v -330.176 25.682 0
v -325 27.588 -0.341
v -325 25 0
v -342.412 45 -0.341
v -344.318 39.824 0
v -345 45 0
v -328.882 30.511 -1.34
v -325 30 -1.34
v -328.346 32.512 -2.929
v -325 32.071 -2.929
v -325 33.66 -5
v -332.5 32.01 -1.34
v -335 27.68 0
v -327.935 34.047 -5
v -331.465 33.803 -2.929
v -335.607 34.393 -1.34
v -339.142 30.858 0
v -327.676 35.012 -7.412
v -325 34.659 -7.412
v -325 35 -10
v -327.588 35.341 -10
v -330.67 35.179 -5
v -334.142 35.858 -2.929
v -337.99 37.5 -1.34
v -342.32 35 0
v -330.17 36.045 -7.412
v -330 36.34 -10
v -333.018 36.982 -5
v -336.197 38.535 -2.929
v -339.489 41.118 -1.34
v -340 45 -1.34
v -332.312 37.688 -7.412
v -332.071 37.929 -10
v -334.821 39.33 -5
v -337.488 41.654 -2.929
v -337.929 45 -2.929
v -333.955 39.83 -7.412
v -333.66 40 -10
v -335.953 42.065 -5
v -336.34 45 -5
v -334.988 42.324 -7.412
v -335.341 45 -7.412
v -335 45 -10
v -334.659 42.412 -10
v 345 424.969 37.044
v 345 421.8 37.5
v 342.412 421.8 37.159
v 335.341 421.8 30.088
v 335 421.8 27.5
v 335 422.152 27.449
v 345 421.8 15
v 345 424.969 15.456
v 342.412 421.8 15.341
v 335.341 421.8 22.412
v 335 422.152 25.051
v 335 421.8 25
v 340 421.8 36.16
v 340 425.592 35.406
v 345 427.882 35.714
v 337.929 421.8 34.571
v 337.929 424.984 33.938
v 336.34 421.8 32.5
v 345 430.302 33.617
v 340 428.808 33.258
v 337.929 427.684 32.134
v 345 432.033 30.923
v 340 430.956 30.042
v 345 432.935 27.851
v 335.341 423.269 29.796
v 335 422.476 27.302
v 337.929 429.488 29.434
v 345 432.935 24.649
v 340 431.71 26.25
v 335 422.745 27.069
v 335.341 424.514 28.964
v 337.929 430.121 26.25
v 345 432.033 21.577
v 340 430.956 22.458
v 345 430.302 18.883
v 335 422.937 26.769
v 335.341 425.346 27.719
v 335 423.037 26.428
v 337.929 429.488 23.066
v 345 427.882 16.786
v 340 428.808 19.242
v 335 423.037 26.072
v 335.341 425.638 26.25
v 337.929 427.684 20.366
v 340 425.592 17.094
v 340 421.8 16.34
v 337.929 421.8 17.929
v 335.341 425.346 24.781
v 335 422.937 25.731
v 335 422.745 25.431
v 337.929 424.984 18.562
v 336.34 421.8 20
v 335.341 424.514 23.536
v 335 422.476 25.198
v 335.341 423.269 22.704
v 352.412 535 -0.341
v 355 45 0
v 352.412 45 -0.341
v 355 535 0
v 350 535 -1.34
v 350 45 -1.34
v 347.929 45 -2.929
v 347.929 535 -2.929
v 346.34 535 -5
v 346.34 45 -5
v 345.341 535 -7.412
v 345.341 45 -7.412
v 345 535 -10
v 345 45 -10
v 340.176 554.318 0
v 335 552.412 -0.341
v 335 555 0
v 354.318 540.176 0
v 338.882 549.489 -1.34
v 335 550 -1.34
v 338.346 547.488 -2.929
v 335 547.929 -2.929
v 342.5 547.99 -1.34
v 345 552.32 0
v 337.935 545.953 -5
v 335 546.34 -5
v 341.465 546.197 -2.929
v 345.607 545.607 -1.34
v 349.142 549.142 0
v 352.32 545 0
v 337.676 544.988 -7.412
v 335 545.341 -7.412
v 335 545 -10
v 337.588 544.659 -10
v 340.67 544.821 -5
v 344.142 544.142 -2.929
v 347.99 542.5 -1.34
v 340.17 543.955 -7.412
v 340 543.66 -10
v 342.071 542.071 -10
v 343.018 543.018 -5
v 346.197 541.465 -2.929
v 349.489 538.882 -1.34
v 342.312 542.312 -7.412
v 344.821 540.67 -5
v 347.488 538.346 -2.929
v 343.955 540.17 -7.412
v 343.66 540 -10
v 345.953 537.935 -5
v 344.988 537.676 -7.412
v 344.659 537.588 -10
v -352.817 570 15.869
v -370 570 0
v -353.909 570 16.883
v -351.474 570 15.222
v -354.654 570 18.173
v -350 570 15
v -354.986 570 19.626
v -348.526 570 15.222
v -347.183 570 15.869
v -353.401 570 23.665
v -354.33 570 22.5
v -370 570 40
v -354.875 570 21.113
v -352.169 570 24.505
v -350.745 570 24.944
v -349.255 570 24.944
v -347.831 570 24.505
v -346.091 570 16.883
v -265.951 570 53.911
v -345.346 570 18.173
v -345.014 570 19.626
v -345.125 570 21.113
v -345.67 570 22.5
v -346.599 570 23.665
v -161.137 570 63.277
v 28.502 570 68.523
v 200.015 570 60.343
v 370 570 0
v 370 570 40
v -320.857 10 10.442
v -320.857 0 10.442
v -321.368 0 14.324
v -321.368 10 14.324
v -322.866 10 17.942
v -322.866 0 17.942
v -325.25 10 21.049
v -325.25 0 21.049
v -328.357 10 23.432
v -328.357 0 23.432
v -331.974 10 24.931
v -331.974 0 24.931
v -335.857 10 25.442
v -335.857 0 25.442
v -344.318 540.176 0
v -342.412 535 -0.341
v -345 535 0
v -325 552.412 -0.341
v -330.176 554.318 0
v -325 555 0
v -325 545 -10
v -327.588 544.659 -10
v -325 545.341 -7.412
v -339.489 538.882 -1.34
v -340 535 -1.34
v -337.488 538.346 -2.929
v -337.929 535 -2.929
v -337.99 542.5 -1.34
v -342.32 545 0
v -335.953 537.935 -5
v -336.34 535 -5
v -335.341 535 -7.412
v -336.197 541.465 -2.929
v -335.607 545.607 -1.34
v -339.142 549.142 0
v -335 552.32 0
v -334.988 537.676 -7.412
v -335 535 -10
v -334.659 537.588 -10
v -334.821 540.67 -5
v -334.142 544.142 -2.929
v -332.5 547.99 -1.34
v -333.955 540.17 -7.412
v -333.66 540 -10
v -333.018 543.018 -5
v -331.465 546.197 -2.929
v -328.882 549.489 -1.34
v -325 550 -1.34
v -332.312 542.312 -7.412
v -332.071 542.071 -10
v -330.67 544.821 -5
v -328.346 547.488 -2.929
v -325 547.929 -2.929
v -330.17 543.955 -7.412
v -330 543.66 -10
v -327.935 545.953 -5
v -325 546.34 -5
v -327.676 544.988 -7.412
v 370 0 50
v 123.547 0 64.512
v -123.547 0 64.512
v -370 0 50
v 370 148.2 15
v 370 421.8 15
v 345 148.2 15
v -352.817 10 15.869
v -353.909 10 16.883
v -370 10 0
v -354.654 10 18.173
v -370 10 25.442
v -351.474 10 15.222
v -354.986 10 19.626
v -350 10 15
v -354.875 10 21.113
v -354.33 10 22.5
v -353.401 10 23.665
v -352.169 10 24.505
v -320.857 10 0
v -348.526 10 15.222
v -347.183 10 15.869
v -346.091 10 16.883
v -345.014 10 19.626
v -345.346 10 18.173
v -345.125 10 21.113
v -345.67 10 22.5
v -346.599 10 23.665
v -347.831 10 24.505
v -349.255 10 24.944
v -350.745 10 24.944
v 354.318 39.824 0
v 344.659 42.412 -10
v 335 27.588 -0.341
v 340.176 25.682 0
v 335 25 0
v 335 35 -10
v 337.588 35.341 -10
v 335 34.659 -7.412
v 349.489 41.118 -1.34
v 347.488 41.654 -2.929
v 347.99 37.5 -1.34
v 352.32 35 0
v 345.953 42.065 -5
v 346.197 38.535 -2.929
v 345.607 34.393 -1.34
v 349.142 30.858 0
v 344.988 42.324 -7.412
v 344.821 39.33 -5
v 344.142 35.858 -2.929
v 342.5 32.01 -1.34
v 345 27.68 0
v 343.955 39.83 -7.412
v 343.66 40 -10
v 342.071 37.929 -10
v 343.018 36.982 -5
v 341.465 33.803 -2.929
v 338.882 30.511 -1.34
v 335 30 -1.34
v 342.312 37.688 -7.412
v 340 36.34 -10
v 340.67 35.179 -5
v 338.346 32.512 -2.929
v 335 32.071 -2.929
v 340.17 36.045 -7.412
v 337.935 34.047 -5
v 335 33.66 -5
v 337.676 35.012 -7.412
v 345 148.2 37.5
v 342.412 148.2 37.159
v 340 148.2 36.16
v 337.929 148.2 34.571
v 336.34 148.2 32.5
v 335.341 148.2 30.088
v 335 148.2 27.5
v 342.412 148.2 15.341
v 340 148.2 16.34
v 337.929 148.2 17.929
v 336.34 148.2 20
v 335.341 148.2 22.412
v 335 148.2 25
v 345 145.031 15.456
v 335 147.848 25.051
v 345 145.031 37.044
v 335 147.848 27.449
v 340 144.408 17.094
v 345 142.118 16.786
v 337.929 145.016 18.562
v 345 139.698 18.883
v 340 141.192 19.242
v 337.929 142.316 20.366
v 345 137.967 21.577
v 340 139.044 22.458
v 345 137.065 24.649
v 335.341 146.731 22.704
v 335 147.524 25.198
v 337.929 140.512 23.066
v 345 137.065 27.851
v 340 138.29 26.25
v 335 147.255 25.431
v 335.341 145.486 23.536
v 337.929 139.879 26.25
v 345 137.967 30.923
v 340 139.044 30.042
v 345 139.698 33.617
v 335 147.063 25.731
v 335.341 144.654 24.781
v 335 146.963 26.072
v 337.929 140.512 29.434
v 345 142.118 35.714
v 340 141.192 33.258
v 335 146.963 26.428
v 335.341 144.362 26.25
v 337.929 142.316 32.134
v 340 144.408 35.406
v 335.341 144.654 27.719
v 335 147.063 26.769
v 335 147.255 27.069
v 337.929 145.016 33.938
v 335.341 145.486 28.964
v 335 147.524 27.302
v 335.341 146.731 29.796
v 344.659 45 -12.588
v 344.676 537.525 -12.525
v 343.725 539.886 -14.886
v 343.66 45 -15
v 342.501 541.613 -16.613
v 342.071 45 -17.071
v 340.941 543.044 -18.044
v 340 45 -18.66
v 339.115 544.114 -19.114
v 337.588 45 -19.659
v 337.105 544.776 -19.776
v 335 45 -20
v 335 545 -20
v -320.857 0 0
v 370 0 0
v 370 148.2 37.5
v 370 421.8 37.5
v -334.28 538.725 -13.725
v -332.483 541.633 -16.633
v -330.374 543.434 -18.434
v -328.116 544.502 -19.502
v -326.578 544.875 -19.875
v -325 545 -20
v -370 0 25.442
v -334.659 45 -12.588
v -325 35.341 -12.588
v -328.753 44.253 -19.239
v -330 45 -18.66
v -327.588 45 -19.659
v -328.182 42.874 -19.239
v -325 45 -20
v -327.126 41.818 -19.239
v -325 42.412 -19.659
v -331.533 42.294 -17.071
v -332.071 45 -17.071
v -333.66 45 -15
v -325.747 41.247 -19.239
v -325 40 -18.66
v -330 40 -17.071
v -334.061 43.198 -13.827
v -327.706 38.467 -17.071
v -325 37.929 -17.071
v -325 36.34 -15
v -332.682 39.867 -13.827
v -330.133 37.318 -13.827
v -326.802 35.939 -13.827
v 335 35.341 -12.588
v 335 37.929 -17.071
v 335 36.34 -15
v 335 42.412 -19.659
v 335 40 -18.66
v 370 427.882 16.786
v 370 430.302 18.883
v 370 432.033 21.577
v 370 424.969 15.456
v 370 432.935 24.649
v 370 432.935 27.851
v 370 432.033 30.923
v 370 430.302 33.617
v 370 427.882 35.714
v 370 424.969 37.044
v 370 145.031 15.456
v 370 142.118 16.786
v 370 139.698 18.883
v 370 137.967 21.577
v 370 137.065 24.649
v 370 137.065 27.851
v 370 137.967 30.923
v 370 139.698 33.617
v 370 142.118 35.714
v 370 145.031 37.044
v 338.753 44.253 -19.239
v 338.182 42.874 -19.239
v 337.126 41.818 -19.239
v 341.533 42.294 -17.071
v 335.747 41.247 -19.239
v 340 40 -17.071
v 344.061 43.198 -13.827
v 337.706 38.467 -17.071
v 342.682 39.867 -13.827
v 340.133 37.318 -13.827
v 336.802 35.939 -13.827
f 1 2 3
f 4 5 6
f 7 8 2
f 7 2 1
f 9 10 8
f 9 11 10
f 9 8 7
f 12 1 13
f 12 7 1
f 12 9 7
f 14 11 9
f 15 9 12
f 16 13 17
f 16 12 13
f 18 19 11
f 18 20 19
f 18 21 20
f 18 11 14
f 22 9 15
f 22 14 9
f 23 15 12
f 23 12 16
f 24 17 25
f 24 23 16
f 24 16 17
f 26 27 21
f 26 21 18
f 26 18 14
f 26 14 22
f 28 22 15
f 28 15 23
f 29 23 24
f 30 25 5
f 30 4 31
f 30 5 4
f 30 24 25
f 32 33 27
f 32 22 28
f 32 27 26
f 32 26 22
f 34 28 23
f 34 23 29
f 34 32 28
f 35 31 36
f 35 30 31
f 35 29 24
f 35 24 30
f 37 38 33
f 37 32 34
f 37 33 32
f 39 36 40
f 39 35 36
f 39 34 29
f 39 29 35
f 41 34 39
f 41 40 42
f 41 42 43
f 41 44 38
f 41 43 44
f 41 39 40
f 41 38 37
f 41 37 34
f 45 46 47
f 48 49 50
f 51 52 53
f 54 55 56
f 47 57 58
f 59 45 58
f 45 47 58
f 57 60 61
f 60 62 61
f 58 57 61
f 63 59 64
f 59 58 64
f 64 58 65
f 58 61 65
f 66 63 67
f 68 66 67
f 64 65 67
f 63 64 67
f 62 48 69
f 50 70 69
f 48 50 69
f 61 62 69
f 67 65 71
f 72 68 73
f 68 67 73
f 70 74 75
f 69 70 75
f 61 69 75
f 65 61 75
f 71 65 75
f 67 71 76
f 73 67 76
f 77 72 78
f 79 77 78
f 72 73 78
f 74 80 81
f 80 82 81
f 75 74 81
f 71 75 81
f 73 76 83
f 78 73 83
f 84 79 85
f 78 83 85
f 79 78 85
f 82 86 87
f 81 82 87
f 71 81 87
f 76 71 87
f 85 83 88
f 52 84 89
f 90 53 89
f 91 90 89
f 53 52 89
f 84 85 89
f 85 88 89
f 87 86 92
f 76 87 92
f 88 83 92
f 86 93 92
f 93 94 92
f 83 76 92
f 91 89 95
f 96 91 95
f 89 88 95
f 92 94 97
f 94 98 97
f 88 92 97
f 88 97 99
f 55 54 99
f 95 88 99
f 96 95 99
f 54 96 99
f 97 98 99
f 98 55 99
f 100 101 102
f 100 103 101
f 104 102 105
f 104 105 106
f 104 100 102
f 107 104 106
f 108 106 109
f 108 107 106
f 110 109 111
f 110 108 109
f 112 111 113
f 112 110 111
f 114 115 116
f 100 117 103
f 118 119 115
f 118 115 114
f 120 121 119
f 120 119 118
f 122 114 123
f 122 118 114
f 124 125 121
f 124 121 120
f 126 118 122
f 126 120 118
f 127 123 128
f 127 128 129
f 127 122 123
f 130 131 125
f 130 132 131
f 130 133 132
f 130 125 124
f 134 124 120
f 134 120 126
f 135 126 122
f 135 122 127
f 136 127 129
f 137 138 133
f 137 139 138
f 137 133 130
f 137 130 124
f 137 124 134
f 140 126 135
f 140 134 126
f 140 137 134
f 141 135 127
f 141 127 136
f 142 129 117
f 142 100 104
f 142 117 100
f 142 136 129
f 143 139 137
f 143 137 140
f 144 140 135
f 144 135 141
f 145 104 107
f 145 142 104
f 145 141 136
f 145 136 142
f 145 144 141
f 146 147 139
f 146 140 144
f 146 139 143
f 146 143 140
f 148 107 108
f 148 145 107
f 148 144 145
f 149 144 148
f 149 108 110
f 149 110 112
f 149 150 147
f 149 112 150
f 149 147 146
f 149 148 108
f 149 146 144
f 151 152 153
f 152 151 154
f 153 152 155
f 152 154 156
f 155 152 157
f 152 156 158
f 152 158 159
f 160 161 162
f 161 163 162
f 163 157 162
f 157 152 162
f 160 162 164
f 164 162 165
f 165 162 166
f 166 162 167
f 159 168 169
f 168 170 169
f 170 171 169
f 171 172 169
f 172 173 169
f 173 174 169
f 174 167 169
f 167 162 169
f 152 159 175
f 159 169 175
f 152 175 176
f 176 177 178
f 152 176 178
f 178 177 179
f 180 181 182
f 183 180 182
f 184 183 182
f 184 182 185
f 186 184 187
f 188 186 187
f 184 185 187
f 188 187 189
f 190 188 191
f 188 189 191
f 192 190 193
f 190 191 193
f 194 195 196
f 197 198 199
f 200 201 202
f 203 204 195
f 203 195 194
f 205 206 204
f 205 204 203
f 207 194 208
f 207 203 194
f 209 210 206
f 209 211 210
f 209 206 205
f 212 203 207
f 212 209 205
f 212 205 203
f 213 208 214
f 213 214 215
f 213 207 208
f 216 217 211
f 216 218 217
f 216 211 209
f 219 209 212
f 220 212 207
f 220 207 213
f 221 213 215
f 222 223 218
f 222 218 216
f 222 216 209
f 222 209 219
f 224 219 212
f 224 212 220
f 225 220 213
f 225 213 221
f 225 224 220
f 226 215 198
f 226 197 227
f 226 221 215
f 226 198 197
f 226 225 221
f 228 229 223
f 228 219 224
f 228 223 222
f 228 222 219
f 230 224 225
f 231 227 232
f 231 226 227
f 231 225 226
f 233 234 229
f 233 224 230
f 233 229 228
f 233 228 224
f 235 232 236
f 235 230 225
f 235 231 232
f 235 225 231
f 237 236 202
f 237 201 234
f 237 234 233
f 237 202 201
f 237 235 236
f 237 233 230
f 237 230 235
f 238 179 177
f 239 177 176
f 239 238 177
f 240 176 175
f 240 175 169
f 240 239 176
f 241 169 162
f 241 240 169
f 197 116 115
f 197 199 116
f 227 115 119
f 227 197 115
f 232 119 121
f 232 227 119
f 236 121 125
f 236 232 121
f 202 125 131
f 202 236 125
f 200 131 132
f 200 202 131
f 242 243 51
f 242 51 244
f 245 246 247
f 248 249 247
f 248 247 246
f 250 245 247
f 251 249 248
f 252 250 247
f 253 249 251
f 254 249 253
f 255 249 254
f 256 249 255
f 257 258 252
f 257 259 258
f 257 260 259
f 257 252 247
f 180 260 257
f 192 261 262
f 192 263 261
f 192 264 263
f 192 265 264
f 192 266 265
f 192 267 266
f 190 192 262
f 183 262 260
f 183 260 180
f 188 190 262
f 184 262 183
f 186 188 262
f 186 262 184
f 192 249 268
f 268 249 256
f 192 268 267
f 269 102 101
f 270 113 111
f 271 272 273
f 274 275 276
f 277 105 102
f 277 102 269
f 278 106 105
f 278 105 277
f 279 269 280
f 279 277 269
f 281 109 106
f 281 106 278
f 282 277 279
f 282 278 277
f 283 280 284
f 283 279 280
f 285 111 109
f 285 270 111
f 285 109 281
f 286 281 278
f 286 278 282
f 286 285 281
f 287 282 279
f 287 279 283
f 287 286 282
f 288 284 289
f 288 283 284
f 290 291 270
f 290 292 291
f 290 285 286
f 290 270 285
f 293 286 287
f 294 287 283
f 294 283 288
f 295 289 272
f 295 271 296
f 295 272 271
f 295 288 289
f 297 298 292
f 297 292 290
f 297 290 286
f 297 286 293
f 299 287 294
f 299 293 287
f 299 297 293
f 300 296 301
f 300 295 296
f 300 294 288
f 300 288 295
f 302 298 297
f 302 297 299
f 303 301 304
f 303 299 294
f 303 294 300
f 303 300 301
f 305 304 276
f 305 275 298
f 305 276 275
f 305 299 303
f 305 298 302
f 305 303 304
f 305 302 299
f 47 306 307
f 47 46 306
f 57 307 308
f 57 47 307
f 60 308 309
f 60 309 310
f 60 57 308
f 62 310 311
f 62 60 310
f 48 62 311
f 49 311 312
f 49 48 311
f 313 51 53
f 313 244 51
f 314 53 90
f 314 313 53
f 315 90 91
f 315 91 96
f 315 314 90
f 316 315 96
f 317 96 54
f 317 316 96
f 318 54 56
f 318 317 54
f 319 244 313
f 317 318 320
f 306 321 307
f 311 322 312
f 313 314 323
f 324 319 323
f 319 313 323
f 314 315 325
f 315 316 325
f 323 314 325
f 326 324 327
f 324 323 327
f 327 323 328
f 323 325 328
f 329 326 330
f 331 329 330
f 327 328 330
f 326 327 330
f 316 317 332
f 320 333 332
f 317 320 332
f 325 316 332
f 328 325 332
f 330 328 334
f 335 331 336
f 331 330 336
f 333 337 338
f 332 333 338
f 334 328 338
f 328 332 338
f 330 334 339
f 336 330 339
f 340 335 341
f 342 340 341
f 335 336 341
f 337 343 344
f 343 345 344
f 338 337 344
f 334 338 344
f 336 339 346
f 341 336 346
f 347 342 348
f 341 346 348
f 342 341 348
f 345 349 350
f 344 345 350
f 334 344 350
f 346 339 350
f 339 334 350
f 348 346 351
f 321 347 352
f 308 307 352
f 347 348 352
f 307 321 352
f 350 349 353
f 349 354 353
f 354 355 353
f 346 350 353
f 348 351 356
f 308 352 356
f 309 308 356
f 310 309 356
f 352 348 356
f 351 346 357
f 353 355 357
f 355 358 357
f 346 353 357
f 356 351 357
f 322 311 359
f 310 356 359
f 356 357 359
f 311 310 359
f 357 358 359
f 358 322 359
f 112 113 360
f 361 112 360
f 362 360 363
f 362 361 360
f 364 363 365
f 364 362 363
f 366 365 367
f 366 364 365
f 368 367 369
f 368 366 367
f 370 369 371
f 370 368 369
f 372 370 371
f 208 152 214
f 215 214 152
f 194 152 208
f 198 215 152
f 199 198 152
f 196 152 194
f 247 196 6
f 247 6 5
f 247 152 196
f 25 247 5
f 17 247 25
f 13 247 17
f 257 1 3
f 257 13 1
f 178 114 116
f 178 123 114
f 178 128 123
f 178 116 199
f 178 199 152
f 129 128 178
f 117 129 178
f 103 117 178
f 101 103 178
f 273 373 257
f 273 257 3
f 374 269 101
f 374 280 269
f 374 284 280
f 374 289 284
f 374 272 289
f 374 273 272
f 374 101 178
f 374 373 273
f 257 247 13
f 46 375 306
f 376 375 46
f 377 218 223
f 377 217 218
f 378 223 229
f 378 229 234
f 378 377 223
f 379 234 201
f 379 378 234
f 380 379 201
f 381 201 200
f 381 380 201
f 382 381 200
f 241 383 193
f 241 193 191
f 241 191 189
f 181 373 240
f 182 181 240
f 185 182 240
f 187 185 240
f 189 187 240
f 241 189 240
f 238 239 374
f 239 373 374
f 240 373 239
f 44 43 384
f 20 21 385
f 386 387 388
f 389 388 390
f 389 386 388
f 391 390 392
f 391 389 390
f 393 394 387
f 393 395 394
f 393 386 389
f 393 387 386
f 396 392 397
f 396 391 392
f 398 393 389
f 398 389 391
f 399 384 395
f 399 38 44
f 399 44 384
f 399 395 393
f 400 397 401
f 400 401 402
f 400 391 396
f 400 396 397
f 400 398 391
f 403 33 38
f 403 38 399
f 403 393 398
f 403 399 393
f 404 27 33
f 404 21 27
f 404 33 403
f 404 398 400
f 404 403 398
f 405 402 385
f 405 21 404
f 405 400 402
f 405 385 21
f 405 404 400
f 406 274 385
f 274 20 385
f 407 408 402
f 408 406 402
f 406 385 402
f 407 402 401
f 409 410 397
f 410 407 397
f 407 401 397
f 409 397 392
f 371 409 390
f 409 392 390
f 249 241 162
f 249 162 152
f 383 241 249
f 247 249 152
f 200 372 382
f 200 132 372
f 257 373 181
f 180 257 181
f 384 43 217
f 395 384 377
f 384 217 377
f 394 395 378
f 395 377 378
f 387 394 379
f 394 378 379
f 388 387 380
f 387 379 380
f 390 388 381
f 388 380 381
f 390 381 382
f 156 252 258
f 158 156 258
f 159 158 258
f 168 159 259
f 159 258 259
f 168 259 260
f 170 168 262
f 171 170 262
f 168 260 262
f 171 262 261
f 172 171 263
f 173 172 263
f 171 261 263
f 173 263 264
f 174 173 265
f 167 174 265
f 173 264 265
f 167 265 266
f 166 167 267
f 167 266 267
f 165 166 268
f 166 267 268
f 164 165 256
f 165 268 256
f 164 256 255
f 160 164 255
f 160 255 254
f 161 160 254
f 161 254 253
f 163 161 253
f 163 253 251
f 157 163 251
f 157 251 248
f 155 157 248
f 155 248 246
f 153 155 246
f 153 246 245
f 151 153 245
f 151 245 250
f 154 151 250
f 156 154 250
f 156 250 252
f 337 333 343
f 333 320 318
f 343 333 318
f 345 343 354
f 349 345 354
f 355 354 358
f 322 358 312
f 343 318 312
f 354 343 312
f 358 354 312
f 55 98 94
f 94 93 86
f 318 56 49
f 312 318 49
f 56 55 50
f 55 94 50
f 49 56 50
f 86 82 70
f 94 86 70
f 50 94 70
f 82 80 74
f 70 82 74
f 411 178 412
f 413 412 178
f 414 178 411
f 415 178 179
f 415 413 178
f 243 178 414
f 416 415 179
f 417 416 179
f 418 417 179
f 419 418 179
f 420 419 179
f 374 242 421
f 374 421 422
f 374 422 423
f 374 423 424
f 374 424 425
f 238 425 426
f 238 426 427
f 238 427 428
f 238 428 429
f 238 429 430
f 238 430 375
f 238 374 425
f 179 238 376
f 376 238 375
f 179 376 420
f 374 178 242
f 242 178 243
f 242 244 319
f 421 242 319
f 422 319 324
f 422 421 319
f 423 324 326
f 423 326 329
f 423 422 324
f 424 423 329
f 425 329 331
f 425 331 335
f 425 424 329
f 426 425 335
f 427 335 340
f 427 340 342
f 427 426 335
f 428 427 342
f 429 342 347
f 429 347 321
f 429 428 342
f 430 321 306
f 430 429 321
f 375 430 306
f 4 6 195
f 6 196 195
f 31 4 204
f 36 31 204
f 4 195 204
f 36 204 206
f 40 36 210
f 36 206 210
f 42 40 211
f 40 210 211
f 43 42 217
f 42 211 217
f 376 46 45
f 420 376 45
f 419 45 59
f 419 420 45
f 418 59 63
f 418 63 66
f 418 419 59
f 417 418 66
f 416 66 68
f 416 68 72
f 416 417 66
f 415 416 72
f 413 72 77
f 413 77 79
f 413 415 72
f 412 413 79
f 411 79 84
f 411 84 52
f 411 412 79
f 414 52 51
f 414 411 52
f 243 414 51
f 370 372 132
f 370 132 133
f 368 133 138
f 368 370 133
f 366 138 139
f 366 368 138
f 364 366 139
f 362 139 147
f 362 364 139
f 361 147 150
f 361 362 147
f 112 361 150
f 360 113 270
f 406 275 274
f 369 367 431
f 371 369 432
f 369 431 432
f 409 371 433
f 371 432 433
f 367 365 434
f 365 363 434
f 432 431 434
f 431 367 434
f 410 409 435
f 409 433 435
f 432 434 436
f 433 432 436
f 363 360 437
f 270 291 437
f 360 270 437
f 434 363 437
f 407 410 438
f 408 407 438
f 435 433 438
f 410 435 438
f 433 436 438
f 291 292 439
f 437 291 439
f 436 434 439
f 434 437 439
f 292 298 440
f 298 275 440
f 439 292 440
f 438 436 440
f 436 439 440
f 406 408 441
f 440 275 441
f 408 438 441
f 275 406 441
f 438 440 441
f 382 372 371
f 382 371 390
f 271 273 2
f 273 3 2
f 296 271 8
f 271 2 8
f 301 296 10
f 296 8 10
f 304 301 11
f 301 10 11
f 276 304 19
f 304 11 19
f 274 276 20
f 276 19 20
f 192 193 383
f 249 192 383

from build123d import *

# Parameters (mm, degrees)
CORTE_EXTRUS_O3_REACH    = 685.022
ESBO_O5_R                = 5
CORTE_EXTRUS_O4_DEPTH    = 10
ESBO_O8_W                = 680
ESBO_O8_H                = 510
RESSALTO_EXTRUS_O1_DEPTH = 20
FILETE1_R                = 10
CORTE_EXTRUS_O5_DEPTH    = 35
FILETE17_R               = 10


with BuildPart() as part:
    # Esboço2 for Loft1 → Loft1 section 0
    with BuildSketch(Plane(origin=(0, 570, 0), x_dir=(1, 0, 0), z_dir=(0, 1, 0))):
        with BuildLine():
            Line((-370, 0), (370, 0))
            Line((370, 0), (370, -40))
            # circular arc as an exact rational Bezier (weights 1, cos(half-angle), 1)
            Bezier((370, -40), (0, -97.731859317), (-370, -40), weights=[1, 0.988044857, 1])
            Line((-370, -40), (-370, 0))
        make_face()
    # Esboço1 for Loft1 → Loft1 section 1
    with BuildSketch(Plane(origin=(0, 0, 0), x_dir=(1, 0, 0), z_dir=(0, 1, 0))):
        with BuildLine():
            Line((-370, 0), (370, 0))
            Line((370, 0), (370, -50))
            Bezier((370, -50), (0, -82.722461177), (-370, -50), weights=[1, 0.996112056, 1])
            Line((-370, -50), (-370, 0))
        make_face()
    loft()

    # Esboço5 → Corte-extrusão3 (cut, up to next)
    with BuildSketch(Plane.XZ, mode=Mode.PRIVATE) as corte_extrus_o3_sk1:
        with Locations(Location((-350, 20, 0), (0, 0, 270))):
            Circle(ESBO_O5_R)
    corte_extrus_o3_tool1 = extrude(corte_extrus_o3_sk1.sketch, amount=-CORTE_EXTRUS_O3_REACH, mode=Mode.PRIVATE) & part.part
    add(corte_extrus_o3_tool1.solids().sort_by_distance((-350, 0, 20))[0], mode=Mode.SUBTRACT)

    # Esboço6 → Corte-extrusão4 (cut)
    with BuildSketch(Plane.XZ):
        with BuildLine():
            Line((-370, 0), (-320.856761827, 0))
            Line((-320.856761827, 0), (-320.856761827, 10.441916975))
            ThreePointArc((-320.856761827, 10.441916975), (-325.250160109, 21.048518693), (-335.856761827, 25.441916975))
            Line((-335.856761827, 25.441916975), (-370, 25.441916975))
            Line((-370, 25.441916975), (-370, 0))
        make_face()
    extrude(amount=-CORTE_EXTRUS_O4_DEPTH, mode=Mode.SUBTRACT)

    # Esboço8 → Ressalto-extrusão1 (add)
    with BuildSketch(Plane(origin=(0, 0, 0), x_dir=(-1, 0, 0), z_dir=(0, 0, -1))):
        with Locations((-5, 290)):
            Rectangle(ESBO_O8_W, ESBO_O8_H)
    extrude(amount=RESSALTO_EXTRUS_O1_DEPTH)

    # Filete1
    filete1_edges = [part.edges().sort_by_distance(p)[0] for p in [
        (-335, 290, 0),
        (-335, 35, -10),
        (5, 545, 0),
        (-335, 545, -10),
        (345, 290, 0),
        (345, 545, -10),
        (5, 35, 0),
        (345, 35, -10),
        (-335, 290, -20),
        (345, 290, -20),
        (5, 35, -20),
    ]]
    fillet(filete1_edges, radius=FILETE1_R - 0.0001)  # a hair under: the kernel refuses the full size

    # Esboço11 → Corte-extrusão5 (cut)
    with BuildSketch(Plane(origin=(370, 0, 0), x_dir=(0, 0, -1), z_dir=(1, 0, 0))):
        with BuildLine():
            Line((-37.5, 148.2), (-37.5, 421.8))
            ThreePointArc((-37.5, 421.8), (-26.25, 433.05), (-15, 421.8))
            Line((-15, 421.8), (-15, 148.2))
            ThreePointArc((-15, 148.2), (-26.25, 136.95), (-37.5, 148.2))
        make_face()
    extrude(amount=-CORTE_EXTRUS_O5_DEPTH, mode=Mode.SUBTRACT)

    # Filete17
    filete17_edges = [part.edges().sort_by_distance(p)[0] for p in [
        (335, 136.95, 26.25),
        (335, 285, 37.5),
        (335, 433.05, 26.25),
        (335, 285, 15),
    ]]
    fillet(filete17_edges, radius=FILETE17_R)


solid = part.part
